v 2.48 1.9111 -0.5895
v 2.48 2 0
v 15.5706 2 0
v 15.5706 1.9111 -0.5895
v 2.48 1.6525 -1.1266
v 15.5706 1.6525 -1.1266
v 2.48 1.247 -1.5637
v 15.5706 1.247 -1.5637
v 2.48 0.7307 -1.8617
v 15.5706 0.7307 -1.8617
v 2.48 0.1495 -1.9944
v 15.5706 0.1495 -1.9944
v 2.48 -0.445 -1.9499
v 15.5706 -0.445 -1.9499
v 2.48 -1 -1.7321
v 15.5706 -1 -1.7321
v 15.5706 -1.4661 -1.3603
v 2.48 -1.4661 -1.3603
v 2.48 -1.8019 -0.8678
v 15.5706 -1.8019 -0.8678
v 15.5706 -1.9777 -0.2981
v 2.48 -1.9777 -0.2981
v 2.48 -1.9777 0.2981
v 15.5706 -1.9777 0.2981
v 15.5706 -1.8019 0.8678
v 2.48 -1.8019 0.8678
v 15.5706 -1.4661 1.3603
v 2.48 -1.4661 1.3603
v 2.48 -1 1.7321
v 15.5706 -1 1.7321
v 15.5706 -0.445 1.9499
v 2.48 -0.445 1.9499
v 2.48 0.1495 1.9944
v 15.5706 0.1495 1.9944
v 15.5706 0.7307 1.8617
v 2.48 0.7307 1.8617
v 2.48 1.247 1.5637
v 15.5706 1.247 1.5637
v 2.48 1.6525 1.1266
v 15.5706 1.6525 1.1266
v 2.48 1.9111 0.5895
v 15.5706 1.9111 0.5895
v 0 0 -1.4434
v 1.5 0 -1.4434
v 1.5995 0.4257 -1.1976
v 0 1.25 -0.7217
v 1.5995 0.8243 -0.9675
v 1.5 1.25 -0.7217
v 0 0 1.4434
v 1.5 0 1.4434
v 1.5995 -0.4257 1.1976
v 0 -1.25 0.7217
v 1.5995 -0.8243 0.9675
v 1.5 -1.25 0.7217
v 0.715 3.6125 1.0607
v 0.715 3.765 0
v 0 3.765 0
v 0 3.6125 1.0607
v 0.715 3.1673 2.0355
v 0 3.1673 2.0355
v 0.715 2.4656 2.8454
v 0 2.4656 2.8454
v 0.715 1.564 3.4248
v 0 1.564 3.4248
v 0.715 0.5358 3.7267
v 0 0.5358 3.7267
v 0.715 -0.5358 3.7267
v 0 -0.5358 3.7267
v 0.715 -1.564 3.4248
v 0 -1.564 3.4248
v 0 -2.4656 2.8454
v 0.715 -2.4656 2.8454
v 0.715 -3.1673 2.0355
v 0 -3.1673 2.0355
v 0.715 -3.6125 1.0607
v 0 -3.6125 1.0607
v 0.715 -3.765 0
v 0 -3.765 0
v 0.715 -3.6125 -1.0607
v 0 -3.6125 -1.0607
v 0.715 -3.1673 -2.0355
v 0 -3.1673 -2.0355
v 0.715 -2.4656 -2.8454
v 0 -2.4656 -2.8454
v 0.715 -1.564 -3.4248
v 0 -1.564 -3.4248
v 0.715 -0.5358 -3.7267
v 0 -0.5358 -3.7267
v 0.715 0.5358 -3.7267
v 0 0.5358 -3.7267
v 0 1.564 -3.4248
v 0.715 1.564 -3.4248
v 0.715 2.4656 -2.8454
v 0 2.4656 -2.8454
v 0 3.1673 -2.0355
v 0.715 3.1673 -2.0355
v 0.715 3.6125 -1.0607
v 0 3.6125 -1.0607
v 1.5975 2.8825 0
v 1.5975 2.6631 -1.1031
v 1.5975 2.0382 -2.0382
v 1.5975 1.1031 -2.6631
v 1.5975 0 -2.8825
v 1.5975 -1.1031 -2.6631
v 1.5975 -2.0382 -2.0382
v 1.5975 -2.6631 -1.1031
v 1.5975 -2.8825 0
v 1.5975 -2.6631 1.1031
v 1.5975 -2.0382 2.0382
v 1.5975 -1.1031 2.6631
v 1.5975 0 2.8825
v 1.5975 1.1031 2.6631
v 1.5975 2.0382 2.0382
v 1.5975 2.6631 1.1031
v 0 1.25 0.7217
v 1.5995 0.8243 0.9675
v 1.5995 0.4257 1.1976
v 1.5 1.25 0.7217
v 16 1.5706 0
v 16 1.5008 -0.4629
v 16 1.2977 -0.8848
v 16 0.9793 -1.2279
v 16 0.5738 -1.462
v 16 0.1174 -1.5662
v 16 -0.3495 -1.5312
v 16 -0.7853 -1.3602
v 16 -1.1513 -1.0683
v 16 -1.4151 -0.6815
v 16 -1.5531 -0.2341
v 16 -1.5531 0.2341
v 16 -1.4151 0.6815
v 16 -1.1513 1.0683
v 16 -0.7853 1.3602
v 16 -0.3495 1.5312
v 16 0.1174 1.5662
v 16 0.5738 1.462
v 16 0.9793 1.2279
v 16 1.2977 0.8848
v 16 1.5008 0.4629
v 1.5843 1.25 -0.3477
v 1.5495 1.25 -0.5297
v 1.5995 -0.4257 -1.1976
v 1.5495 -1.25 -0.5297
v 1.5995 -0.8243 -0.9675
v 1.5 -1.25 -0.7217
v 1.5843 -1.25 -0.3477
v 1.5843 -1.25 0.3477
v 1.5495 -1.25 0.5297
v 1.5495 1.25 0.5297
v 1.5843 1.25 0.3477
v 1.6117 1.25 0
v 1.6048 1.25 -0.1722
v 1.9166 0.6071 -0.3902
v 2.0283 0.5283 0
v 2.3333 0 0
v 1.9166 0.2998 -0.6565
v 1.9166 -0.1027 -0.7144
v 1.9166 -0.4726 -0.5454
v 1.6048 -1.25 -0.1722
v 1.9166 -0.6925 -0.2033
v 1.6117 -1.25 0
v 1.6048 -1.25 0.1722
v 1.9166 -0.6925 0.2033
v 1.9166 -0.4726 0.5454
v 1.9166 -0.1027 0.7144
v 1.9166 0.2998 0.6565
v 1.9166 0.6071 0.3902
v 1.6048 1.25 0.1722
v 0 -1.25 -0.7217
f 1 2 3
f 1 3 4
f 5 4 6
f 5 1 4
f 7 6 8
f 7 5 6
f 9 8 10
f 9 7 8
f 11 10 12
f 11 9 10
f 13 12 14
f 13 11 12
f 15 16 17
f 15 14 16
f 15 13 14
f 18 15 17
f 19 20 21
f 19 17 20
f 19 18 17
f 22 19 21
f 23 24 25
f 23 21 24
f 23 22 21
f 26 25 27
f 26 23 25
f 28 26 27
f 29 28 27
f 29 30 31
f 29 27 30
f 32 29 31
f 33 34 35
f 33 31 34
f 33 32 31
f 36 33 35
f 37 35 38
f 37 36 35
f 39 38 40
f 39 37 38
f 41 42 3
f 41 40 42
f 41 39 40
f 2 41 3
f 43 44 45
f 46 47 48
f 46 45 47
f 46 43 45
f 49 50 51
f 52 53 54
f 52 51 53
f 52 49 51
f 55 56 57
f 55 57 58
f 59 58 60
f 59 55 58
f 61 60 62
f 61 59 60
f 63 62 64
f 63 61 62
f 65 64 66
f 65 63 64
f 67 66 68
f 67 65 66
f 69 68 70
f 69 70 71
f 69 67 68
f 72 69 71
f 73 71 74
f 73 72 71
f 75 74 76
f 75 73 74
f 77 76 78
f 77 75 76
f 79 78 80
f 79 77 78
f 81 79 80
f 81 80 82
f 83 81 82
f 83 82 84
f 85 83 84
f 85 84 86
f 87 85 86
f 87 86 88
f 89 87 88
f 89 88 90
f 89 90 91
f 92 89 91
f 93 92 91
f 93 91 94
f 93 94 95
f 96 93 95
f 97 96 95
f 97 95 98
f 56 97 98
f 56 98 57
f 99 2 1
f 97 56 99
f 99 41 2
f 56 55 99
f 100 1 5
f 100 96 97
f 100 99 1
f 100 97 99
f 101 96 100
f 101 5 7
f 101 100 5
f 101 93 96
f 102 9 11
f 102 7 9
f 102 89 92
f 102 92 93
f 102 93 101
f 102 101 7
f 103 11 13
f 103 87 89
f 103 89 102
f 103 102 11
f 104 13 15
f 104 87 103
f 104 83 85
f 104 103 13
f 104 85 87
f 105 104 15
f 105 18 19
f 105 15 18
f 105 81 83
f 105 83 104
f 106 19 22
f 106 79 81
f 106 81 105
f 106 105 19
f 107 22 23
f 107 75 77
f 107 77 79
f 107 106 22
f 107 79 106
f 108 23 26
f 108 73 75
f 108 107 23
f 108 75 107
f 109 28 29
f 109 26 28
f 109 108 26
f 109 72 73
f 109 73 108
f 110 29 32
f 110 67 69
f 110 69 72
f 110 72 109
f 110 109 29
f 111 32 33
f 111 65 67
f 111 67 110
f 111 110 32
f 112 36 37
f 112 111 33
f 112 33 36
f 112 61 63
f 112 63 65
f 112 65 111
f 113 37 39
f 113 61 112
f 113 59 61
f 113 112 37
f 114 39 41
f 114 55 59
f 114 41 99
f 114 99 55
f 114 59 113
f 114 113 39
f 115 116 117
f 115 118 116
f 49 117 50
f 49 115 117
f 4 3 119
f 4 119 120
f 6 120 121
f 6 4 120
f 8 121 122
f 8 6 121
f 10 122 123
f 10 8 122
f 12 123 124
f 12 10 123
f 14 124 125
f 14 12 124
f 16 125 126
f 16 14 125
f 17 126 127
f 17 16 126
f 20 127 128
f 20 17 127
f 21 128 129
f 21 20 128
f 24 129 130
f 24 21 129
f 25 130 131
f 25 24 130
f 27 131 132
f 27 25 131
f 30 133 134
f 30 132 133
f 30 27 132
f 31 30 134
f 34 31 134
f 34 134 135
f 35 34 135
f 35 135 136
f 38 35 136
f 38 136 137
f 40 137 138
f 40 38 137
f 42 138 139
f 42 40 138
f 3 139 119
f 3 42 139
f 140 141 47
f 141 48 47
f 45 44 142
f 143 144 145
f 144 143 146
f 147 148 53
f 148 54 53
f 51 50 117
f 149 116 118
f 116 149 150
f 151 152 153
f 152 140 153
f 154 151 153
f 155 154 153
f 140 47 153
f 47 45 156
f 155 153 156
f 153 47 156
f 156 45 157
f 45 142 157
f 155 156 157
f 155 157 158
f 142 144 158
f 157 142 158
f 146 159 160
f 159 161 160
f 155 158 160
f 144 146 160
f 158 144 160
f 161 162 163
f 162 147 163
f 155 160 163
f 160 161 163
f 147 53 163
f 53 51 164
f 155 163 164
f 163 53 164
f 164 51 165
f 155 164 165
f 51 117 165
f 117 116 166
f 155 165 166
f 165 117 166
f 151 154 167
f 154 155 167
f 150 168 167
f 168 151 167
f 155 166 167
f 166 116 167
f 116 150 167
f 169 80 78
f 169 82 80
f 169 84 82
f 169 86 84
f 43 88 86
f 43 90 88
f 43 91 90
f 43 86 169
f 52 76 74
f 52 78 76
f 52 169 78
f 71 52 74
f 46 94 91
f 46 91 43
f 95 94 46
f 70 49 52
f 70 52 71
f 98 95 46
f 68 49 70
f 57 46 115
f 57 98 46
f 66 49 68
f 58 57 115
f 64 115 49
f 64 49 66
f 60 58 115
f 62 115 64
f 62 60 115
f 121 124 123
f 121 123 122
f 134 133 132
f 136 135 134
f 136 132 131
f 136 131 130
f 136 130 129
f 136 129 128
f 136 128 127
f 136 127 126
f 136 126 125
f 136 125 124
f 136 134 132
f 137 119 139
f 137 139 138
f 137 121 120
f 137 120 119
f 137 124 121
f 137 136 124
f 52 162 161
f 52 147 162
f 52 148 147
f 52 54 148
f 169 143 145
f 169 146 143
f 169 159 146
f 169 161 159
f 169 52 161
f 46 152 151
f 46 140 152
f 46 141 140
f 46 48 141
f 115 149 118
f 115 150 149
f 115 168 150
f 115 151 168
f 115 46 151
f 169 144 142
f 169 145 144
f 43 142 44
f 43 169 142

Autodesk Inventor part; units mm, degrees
ref_plane "YZ Plane" through (0, 0, 0) normal (1, 0, 0) x (0, 1, 0)
ref_plane "XZ Plane" through (0, 0, 0) normal (0, 1, 0) x (-1, 0, 0)
sketch "Skizze1" plane through (0, 0, 0) normal (0, 0, 1) x (1, 0, 0)
  line L0 (16, 0) -> (16, 2)
  line L1 (16, 2) -> (4.58, 2)
  line L2 (4.58, 2) -> (4.1506, 2)
  line L3 (0, 3.765) -> (0, 1.4434)
  line L4 (0, 1.4434) -> (1.5, 1.4434)
  line L5 (1.5, 1.4434) -> (2.3333, 0)
  line L6 (2.3333, 0) -> (16, 0)
  line L7 (0, 3.765) -> (0.715, 3.765)
  line L8 (0.715, 3.765) -> (2.48, 2)
  line L9 (4.1506, 2) -> (2.48, 2)
  line L10 (4.58, 2) -> (2.48, 2) construction
  line L11 (2.48, 2) -> (2.48, 2)
  line L12 (-3.2, 0) -> (19.2, 0) projected
  line L13 (0, -0.753) -> (0, 4.518) projected
  dimension "d0" = 16
  dimension "d1" = 11.42
  dimension "d2" = 1.5
  dimension "d3" = 4
  dimension "d6" = 2.48
  dimension "d7" = 45
  dimension "d8" = 2.8868
  dimension "d9" = 60
  dimension "d10" = 7.53
  dimension "d11" = 4
  dimension "d12" = 0.4294
revolve "Körper" add sketch "Skizze1" angle 360 about axis through (2.3333, 0, 0) along (1, 0, 0) contours L6 L5 L4 L3 L7 L8 L9 L2 L1 L0
sketch "Skizze2" plane through (0, 0, 0) normal (-1, 0, 0) x (0, 0, 1)
  circle A0 centre (0, 0) radius 1.4434 projected
  line L0 (0, -5.271) -> (0, 5.271) projected
  line L1 (-5.271, 0) -> (5.271, 0) projected
  line L2 (1.4434, 0) -> (0.7217, -1.25)
  line L3 (0.7217, -1.25) -> (-0.7217, -1.25)
  line L4 (-0.7217, -1.25) -> (-1.4434, 0)
  line L5 (-1.4434, 0) -> (-0.7217, 1.25)
  line L6 (-0.7217, 1.25) -> (0.7217, 1.25)
  line L7 (0.7217, 1.25) -> (1.4434, 0)
  point P0 (0, 1.4434)
extrude "Loch" add sketch "Skizze2" against normal up to next contours L7 A0 | A0 L2 | L6 L0 A0 | A0 L0 L3 | L0 L6 A0 | A0 L3 L0 | L4 A0 | A0 L5
thread "Gewinde" size "M4x0.7" class "6g" standard "ISO Metric profile" length 11.42
chamfer "Fase1" distance 0.4294 distance2 0.4294 1 edges at (16, -2, 0) measured on face at (16, 0.2227, -0.5871)
ref_plane "Work Plane1" through (104.775, 0, 0) normal (0, 0, -1) x (1, 0, 0)
equation "\"d15\" = GEL"
equation "\"d17\" = -0.5 * SPD + 0.5 * GD"
equation "\"d18\" = GUL"
equation "\"d0\" = NLG"
equation "\"d1\" = GEL"
equation "\"d2\" = INTI"
equation "\"d3\" = GD"
equation "\"d6\" = KOH"
equation "\"d7\" = 0.5 * SEWI"
equation "\"d8\" = 1.1547 * SW"
equation "\"d10\" = KOD"
equation "\"d11\" = BDM"
equation "\"d12\" = GAL"
equation "\"NLG\" = 16"
equation "\"INTI\" = 1.5"
equation "\"GEL\" = 11.42"
equation "\"GAL\" = 0.61345 * PTC"
equation "\"KOH\" = 2.48"
equation "\"KOD\" = 7.53"
equation "\"GUL\" = 0.61345 * PTC"
equation "\"SPD\" = NND - 1.2269 * PTC"
equation "\"BDM\" = NND"
equation "\"GD\" = NND"
equation "\"SEWI\" = 90deg"
equation "\"SW\" = 2.5"
equation "\"TOA\" = 30deg"
equation "\"GD1\" = THREADDIA - 1.2269 * PTC"
equation "\"EPV\" = 4.58"
equation "\"THREADDIA\" = 4"
equation "\"PTC\" = 0.7"
equation "\"NND\" = 4"
equation "\"E0\" = 2.89"
properties part number "ISO 10642  - M4  x  16" material "Stahl"
